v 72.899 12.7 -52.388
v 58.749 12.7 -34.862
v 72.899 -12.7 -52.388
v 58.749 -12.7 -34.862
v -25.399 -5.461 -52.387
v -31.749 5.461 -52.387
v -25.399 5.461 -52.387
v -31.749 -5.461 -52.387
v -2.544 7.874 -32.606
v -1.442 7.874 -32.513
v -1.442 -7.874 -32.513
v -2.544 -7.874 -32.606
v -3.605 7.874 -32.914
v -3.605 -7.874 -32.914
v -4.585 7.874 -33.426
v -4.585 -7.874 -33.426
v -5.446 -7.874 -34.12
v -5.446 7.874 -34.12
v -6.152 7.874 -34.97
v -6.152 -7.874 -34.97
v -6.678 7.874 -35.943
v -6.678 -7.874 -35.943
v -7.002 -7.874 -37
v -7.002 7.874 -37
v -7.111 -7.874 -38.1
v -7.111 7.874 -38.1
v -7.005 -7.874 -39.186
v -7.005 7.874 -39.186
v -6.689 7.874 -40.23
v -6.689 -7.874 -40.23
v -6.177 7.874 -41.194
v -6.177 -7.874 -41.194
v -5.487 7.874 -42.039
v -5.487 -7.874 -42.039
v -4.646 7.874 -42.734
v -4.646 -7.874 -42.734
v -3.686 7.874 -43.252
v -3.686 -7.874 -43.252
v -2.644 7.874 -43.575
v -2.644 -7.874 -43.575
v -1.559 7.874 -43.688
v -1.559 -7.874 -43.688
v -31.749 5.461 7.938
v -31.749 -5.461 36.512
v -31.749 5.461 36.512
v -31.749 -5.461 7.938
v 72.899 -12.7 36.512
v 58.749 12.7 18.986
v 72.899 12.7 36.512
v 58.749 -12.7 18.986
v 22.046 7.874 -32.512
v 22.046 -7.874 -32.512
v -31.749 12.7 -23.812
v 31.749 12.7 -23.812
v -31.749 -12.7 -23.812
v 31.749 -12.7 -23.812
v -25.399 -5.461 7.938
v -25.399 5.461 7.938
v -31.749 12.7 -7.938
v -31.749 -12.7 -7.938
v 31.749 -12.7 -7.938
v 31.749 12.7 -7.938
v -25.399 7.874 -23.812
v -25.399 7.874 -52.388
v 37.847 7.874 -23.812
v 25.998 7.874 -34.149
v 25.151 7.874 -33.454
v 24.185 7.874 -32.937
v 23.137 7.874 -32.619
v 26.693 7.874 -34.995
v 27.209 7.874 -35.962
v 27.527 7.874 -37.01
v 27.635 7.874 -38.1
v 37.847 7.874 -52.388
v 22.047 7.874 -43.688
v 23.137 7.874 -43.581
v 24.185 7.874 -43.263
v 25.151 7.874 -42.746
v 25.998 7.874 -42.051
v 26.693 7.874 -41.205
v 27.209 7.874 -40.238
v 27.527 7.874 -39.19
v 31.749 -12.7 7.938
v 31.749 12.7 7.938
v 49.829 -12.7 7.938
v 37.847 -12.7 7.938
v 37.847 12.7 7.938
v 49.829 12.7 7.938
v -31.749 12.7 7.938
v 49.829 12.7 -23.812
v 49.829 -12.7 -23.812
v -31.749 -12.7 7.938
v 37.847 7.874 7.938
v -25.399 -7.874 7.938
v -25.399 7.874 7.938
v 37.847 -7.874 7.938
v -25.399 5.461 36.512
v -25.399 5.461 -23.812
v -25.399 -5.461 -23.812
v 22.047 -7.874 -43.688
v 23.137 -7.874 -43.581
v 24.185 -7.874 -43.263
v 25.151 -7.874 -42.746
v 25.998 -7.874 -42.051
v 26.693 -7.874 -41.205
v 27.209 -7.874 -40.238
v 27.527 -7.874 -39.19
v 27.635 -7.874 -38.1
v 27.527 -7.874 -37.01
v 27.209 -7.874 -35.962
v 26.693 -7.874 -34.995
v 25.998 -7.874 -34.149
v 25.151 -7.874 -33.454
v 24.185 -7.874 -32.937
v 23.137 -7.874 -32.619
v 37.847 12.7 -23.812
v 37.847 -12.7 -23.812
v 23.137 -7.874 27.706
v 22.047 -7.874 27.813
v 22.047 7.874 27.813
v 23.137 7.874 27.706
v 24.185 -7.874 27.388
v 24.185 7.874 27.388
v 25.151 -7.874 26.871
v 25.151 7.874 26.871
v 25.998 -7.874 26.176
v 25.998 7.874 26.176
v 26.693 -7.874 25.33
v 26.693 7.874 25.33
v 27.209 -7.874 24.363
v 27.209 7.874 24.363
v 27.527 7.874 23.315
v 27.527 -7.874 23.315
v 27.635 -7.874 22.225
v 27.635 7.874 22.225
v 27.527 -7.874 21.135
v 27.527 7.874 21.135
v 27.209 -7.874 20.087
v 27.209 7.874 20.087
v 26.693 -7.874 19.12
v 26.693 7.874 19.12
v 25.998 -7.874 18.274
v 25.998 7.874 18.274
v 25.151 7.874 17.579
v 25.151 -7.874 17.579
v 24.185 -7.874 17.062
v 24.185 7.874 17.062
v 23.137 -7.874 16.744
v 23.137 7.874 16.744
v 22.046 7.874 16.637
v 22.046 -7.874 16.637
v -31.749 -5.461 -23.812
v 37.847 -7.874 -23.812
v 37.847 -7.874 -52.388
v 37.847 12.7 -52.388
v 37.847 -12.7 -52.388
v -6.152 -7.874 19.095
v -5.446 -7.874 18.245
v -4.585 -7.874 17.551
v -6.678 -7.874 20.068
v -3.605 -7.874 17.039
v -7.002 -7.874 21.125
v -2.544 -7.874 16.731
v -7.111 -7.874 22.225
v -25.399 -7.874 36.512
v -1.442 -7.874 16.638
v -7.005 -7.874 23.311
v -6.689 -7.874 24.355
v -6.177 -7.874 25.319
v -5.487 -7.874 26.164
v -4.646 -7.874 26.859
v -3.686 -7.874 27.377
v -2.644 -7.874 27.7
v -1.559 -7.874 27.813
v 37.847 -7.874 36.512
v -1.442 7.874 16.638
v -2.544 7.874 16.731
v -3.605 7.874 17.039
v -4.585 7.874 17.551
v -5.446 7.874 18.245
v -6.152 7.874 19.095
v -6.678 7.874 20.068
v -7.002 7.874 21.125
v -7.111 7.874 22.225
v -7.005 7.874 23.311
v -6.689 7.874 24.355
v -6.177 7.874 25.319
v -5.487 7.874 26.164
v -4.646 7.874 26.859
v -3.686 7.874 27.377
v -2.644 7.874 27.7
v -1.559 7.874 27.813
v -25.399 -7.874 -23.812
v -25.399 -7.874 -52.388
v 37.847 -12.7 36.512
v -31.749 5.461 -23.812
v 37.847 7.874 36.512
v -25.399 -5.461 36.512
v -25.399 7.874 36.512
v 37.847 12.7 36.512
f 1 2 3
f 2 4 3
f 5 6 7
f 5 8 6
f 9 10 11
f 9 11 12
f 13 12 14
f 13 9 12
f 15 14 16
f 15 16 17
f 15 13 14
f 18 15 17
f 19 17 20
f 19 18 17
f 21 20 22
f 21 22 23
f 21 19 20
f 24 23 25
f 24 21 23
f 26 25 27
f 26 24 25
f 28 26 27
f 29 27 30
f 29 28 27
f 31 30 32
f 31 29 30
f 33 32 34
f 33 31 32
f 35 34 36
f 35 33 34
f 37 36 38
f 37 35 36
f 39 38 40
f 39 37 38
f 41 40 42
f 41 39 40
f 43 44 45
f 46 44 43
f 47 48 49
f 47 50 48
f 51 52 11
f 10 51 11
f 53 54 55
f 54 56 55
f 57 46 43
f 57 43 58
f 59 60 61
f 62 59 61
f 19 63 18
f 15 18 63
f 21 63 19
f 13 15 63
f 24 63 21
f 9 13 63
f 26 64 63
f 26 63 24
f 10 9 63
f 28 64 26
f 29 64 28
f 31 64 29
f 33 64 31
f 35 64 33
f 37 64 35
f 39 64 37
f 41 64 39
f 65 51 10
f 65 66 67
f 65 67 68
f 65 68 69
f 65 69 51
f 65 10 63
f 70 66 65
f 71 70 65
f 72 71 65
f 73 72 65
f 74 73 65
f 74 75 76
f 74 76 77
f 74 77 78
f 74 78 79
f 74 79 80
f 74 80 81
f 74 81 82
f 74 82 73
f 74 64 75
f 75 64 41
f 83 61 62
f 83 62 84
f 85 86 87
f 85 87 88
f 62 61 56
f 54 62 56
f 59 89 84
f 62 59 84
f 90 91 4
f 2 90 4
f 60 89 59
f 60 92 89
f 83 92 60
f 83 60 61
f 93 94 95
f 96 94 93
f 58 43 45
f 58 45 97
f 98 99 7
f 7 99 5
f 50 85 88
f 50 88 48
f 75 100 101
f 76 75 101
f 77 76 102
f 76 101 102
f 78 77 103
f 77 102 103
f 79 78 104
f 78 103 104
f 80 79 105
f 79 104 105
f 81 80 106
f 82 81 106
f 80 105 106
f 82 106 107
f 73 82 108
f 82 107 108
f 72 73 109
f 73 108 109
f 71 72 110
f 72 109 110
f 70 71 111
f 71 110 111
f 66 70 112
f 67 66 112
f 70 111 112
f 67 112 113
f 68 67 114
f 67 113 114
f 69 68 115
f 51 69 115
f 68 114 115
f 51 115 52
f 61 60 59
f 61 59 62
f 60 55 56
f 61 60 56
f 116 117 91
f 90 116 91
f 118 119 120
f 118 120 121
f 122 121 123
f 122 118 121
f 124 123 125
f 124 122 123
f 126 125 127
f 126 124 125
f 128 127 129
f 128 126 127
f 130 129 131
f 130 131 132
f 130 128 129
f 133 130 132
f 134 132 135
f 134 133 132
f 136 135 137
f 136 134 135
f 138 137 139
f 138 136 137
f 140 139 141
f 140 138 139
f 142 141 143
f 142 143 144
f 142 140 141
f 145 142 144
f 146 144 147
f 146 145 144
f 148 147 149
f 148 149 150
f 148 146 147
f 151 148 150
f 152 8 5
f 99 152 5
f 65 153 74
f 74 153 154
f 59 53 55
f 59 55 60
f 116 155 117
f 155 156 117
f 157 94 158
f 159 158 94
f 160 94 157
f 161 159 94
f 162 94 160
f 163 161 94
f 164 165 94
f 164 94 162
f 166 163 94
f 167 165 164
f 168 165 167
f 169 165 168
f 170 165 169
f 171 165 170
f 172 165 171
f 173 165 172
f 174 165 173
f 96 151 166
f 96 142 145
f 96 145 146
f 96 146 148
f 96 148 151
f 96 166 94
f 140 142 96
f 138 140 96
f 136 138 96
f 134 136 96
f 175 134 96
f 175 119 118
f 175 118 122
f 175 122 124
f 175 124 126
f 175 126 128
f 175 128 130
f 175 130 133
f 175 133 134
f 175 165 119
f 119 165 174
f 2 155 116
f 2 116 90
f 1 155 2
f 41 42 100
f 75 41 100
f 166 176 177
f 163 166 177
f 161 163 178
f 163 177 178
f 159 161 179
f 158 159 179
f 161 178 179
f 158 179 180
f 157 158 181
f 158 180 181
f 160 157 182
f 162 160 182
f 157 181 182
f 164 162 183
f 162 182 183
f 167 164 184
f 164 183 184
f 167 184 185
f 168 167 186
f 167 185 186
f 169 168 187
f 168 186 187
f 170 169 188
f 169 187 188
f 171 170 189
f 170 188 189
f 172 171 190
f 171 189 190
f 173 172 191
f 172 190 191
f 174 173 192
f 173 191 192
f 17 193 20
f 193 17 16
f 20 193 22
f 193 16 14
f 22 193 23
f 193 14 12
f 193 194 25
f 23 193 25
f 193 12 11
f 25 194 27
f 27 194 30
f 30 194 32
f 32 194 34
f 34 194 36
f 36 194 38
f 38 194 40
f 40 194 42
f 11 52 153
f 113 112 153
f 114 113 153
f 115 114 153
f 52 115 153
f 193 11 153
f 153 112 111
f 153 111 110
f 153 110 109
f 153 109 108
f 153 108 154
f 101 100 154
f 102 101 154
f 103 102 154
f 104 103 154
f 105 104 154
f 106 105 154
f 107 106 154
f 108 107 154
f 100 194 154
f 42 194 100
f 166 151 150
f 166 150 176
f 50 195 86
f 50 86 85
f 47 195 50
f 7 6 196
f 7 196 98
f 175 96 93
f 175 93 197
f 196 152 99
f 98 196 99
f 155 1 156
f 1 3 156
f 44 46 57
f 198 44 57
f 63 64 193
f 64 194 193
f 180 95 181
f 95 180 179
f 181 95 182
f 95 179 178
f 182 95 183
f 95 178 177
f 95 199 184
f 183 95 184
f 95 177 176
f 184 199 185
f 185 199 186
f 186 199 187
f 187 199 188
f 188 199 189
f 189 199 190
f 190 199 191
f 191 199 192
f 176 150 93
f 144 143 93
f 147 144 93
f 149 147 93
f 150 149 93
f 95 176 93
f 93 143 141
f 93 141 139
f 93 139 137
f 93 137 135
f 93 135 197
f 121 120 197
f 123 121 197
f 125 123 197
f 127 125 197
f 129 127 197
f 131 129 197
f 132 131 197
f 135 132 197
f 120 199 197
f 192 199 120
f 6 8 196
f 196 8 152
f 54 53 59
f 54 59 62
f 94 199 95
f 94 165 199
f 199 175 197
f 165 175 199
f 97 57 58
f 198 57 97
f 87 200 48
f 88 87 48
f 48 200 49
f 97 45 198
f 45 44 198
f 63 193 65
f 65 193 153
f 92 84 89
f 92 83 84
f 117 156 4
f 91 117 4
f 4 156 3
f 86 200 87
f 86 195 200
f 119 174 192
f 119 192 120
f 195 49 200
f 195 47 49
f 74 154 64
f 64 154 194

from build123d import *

# Parameters (mm, degrees)
F1_DEPTH = 12.7
F2_DEPTH = 7.874
F0_W     = 6.35
F0_H     = 14.2875
F3_DEPTH = 5.461


with BuildPart() as f1:
    # F0 (on Front) → F1 (new body, symmetric)
    with BuildSketch(Plane.XZ):
        Polygon((-25.3992669116, 7.9375), (-31.7492669116, 7.9375), (-31.7492669116, -7.9375), (31.7492669116, -7.9375), (31.7492669116, 7.9375), align=None)
    extrude(amount=F1_DEPTH, both=True)


with BuildPart() as f1b:
    # F0 (on Front) → F1, piece 2 (new body, symmetric)
    with BuildSketch(Plane.XZ):
        Polygon((37.8467330884, 36.5125), (37.8467330884, 18.9865), (58.7490534106, 18.9865), (72.8987330884, 36.5125), align=None)
        Polygon((37.8467330884, 18.9865), (37.8467330884, 7.9375), (49.8286031789, 7.9375), (58.7490534106, 18.9865), align=None)
    extrude(amount=F1_DEPTH, both=True)


with BuildPart() as f2:
    # F0 (on Front) → F2 (new body, symmetric)
    with BuildSketch(Plane.XZ):
        Polygon((-25.3992669116, 22.225), (-25.3992669116, 7.9375), (31.7492669116, 7.9375), (37.8467330884, 7.9375), (37.8467330884, 18.9865), (37.8467330884, 36.5125), (-25.3992669116, 36.5125), align=None)
        with BuildLine():
            ThreePointArc((-1.4419096179, 16.6375922835), (-5.4457099923, 18.2450271008), (-7.1112669116, 22.225))
            ThreePointArc((-7.1112669116, 22.225), (-5.4870245918, 26.1638283858), (-1.5585220824, 27.8128887849))
            Line((-1.5585220824, 27.8128887849), (22.0465285058, 27.813))
            ThreePointArc((22.0465285058, 27.8129999999), (25.9978582186, 26.1763220015), (27.6345548337, 22.225))
            ThreePointArc((27.6345548337, 22.225), (25.9978177084, 18.2736374889), (22.0464139266, 16.6370000018))
            Line((22.0464139266, 16.6370000018), (-1.4419096179, 16.6375922835))
        make_face(mode=Mode.SUBTRACT)
    extrude(amount=F2_DEPTH, both=True)


with BuildPart() as f3:
    # F0 (on Front) → F3 (new body, symmetric)
    with BuildSketch(Plane.XZ):
        with Locations((-28.5742669116, 29.36875)):
            Rectangle(F0_W, F0_H)
        with Locations((-28.5742669116, 15.08125)):
            Rectangle(F0_W, F0_H)
    extrude(amount=F3_DEPTH, both=True)


with BuildPart() as f4_1:
    # F4: instance of F3
    add(f3.part.mirror(Plane(origin=(0, 0, -7.9375), x_dir=(1, 0, 0), z_dir=(0, 0, -1))))


with BuildPart() as f4_2:
    # F4: instance of F2
    add(f2.part.mirror(Plane(origin=(0, 0, -7.9375), x_dir=(1, 0, 0), z_dir=(0, 0, -1))))


with BuildPart() as f4_3:
    # F4: instance of F1b
    add(f1b.part.mirror(Plane(origin=(0, 0, -7.9375), x_dir=(1, 0, 0), z_dir=(0, 0, -1))))


with BuildPart() as f4_4:
    # F4: instance of F1
    add(f1.part.mirror(Plane(origin=(0, 0, -7.9375), x_dir=(1, 0, 0), z_dir=(0, 0, -1))))


solid = Compound([f1.part, f1b.part, f2.part, f3.part, f4_1.part, f4_2.part, f4_3.part, f4_4.part])
